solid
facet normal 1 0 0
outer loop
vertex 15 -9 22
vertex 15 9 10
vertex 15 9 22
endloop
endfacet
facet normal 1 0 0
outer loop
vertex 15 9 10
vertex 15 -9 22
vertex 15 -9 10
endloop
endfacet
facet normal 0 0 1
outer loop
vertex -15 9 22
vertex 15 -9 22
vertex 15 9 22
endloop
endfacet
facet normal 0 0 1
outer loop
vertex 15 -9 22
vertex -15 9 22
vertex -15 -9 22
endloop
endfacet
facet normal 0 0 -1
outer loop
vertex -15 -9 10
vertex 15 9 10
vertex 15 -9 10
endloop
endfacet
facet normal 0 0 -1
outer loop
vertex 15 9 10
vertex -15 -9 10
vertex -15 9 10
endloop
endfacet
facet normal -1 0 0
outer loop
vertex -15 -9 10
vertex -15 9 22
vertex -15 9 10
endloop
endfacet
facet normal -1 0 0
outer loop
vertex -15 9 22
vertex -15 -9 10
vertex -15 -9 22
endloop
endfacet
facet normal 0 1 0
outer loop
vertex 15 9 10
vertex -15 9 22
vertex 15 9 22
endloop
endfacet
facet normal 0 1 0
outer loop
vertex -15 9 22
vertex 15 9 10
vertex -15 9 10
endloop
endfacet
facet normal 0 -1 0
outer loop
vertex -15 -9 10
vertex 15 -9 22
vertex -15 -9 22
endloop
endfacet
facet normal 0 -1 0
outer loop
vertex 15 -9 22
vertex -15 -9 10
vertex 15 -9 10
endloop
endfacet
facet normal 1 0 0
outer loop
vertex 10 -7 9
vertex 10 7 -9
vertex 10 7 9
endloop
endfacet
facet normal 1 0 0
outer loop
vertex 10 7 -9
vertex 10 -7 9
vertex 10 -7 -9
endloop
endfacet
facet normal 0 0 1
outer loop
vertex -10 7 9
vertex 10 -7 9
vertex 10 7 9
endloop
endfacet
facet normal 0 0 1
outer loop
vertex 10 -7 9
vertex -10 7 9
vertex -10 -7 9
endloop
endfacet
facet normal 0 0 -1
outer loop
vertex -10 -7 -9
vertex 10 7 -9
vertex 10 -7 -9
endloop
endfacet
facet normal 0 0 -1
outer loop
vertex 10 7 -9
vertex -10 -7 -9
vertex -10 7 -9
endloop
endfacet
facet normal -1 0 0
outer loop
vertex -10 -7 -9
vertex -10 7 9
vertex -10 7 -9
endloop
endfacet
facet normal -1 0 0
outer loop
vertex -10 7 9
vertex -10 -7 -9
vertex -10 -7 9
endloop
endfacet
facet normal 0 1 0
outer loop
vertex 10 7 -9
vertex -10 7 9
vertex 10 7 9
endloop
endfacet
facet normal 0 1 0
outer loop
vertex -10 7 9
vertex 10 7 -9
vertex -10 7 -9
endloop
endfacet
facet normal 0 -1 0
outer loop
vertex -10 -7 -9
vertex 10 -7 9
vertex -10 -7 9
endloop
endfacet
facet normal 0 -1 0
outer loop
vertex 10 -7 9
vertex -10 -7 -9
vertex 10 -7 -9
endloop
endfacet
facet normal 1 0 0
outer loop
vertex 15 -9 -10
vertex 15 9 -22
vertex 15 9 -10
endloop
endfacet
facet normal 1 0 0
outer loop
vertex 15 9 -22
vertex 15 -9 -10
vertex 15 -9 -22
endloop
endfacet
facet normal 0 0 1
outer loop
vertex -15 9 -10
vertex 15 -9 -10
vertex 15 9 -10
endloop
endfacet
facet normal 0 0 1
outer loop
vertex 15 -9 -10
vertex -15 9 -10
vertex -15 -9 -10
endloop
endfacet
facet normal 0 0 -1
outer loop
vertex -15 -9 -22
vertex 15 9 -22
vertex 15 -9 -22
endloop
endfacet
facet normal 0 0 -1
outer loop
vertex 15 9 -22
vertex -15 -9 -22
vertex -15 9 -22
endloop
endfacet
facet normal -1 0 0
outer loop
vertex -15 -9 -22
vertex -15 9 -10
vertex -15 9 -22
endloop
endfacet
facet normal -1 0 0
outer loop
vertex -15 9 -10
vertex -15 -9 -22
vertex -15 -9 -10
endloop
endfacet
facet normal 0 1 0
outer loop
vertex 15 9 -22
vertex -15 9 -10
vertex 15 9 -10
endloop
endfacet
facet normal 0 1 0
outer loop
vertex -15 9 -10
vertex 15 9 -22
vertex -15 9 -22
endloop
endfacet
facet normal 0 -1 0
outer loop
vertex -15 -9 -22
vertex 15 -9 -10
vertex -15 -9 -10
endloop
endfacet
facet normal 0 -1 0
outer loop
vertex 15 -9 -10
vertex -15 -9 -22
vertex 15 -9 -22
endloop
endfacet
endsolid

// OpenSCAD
/*
 * handle_strength_test.scad
 * Simplified test for broad upper/lower junctions and grip region.
 */

module broad_junction() {
    cube([30, 18, 12], center=true);
}

module grip_section() {
    cube([20, 14, 18], center=true);
}

union() {
    translate([0, 0, 16]) broad_junction();
    grip_section();
    translate([0, 0, -16]) broad_junction();
}
